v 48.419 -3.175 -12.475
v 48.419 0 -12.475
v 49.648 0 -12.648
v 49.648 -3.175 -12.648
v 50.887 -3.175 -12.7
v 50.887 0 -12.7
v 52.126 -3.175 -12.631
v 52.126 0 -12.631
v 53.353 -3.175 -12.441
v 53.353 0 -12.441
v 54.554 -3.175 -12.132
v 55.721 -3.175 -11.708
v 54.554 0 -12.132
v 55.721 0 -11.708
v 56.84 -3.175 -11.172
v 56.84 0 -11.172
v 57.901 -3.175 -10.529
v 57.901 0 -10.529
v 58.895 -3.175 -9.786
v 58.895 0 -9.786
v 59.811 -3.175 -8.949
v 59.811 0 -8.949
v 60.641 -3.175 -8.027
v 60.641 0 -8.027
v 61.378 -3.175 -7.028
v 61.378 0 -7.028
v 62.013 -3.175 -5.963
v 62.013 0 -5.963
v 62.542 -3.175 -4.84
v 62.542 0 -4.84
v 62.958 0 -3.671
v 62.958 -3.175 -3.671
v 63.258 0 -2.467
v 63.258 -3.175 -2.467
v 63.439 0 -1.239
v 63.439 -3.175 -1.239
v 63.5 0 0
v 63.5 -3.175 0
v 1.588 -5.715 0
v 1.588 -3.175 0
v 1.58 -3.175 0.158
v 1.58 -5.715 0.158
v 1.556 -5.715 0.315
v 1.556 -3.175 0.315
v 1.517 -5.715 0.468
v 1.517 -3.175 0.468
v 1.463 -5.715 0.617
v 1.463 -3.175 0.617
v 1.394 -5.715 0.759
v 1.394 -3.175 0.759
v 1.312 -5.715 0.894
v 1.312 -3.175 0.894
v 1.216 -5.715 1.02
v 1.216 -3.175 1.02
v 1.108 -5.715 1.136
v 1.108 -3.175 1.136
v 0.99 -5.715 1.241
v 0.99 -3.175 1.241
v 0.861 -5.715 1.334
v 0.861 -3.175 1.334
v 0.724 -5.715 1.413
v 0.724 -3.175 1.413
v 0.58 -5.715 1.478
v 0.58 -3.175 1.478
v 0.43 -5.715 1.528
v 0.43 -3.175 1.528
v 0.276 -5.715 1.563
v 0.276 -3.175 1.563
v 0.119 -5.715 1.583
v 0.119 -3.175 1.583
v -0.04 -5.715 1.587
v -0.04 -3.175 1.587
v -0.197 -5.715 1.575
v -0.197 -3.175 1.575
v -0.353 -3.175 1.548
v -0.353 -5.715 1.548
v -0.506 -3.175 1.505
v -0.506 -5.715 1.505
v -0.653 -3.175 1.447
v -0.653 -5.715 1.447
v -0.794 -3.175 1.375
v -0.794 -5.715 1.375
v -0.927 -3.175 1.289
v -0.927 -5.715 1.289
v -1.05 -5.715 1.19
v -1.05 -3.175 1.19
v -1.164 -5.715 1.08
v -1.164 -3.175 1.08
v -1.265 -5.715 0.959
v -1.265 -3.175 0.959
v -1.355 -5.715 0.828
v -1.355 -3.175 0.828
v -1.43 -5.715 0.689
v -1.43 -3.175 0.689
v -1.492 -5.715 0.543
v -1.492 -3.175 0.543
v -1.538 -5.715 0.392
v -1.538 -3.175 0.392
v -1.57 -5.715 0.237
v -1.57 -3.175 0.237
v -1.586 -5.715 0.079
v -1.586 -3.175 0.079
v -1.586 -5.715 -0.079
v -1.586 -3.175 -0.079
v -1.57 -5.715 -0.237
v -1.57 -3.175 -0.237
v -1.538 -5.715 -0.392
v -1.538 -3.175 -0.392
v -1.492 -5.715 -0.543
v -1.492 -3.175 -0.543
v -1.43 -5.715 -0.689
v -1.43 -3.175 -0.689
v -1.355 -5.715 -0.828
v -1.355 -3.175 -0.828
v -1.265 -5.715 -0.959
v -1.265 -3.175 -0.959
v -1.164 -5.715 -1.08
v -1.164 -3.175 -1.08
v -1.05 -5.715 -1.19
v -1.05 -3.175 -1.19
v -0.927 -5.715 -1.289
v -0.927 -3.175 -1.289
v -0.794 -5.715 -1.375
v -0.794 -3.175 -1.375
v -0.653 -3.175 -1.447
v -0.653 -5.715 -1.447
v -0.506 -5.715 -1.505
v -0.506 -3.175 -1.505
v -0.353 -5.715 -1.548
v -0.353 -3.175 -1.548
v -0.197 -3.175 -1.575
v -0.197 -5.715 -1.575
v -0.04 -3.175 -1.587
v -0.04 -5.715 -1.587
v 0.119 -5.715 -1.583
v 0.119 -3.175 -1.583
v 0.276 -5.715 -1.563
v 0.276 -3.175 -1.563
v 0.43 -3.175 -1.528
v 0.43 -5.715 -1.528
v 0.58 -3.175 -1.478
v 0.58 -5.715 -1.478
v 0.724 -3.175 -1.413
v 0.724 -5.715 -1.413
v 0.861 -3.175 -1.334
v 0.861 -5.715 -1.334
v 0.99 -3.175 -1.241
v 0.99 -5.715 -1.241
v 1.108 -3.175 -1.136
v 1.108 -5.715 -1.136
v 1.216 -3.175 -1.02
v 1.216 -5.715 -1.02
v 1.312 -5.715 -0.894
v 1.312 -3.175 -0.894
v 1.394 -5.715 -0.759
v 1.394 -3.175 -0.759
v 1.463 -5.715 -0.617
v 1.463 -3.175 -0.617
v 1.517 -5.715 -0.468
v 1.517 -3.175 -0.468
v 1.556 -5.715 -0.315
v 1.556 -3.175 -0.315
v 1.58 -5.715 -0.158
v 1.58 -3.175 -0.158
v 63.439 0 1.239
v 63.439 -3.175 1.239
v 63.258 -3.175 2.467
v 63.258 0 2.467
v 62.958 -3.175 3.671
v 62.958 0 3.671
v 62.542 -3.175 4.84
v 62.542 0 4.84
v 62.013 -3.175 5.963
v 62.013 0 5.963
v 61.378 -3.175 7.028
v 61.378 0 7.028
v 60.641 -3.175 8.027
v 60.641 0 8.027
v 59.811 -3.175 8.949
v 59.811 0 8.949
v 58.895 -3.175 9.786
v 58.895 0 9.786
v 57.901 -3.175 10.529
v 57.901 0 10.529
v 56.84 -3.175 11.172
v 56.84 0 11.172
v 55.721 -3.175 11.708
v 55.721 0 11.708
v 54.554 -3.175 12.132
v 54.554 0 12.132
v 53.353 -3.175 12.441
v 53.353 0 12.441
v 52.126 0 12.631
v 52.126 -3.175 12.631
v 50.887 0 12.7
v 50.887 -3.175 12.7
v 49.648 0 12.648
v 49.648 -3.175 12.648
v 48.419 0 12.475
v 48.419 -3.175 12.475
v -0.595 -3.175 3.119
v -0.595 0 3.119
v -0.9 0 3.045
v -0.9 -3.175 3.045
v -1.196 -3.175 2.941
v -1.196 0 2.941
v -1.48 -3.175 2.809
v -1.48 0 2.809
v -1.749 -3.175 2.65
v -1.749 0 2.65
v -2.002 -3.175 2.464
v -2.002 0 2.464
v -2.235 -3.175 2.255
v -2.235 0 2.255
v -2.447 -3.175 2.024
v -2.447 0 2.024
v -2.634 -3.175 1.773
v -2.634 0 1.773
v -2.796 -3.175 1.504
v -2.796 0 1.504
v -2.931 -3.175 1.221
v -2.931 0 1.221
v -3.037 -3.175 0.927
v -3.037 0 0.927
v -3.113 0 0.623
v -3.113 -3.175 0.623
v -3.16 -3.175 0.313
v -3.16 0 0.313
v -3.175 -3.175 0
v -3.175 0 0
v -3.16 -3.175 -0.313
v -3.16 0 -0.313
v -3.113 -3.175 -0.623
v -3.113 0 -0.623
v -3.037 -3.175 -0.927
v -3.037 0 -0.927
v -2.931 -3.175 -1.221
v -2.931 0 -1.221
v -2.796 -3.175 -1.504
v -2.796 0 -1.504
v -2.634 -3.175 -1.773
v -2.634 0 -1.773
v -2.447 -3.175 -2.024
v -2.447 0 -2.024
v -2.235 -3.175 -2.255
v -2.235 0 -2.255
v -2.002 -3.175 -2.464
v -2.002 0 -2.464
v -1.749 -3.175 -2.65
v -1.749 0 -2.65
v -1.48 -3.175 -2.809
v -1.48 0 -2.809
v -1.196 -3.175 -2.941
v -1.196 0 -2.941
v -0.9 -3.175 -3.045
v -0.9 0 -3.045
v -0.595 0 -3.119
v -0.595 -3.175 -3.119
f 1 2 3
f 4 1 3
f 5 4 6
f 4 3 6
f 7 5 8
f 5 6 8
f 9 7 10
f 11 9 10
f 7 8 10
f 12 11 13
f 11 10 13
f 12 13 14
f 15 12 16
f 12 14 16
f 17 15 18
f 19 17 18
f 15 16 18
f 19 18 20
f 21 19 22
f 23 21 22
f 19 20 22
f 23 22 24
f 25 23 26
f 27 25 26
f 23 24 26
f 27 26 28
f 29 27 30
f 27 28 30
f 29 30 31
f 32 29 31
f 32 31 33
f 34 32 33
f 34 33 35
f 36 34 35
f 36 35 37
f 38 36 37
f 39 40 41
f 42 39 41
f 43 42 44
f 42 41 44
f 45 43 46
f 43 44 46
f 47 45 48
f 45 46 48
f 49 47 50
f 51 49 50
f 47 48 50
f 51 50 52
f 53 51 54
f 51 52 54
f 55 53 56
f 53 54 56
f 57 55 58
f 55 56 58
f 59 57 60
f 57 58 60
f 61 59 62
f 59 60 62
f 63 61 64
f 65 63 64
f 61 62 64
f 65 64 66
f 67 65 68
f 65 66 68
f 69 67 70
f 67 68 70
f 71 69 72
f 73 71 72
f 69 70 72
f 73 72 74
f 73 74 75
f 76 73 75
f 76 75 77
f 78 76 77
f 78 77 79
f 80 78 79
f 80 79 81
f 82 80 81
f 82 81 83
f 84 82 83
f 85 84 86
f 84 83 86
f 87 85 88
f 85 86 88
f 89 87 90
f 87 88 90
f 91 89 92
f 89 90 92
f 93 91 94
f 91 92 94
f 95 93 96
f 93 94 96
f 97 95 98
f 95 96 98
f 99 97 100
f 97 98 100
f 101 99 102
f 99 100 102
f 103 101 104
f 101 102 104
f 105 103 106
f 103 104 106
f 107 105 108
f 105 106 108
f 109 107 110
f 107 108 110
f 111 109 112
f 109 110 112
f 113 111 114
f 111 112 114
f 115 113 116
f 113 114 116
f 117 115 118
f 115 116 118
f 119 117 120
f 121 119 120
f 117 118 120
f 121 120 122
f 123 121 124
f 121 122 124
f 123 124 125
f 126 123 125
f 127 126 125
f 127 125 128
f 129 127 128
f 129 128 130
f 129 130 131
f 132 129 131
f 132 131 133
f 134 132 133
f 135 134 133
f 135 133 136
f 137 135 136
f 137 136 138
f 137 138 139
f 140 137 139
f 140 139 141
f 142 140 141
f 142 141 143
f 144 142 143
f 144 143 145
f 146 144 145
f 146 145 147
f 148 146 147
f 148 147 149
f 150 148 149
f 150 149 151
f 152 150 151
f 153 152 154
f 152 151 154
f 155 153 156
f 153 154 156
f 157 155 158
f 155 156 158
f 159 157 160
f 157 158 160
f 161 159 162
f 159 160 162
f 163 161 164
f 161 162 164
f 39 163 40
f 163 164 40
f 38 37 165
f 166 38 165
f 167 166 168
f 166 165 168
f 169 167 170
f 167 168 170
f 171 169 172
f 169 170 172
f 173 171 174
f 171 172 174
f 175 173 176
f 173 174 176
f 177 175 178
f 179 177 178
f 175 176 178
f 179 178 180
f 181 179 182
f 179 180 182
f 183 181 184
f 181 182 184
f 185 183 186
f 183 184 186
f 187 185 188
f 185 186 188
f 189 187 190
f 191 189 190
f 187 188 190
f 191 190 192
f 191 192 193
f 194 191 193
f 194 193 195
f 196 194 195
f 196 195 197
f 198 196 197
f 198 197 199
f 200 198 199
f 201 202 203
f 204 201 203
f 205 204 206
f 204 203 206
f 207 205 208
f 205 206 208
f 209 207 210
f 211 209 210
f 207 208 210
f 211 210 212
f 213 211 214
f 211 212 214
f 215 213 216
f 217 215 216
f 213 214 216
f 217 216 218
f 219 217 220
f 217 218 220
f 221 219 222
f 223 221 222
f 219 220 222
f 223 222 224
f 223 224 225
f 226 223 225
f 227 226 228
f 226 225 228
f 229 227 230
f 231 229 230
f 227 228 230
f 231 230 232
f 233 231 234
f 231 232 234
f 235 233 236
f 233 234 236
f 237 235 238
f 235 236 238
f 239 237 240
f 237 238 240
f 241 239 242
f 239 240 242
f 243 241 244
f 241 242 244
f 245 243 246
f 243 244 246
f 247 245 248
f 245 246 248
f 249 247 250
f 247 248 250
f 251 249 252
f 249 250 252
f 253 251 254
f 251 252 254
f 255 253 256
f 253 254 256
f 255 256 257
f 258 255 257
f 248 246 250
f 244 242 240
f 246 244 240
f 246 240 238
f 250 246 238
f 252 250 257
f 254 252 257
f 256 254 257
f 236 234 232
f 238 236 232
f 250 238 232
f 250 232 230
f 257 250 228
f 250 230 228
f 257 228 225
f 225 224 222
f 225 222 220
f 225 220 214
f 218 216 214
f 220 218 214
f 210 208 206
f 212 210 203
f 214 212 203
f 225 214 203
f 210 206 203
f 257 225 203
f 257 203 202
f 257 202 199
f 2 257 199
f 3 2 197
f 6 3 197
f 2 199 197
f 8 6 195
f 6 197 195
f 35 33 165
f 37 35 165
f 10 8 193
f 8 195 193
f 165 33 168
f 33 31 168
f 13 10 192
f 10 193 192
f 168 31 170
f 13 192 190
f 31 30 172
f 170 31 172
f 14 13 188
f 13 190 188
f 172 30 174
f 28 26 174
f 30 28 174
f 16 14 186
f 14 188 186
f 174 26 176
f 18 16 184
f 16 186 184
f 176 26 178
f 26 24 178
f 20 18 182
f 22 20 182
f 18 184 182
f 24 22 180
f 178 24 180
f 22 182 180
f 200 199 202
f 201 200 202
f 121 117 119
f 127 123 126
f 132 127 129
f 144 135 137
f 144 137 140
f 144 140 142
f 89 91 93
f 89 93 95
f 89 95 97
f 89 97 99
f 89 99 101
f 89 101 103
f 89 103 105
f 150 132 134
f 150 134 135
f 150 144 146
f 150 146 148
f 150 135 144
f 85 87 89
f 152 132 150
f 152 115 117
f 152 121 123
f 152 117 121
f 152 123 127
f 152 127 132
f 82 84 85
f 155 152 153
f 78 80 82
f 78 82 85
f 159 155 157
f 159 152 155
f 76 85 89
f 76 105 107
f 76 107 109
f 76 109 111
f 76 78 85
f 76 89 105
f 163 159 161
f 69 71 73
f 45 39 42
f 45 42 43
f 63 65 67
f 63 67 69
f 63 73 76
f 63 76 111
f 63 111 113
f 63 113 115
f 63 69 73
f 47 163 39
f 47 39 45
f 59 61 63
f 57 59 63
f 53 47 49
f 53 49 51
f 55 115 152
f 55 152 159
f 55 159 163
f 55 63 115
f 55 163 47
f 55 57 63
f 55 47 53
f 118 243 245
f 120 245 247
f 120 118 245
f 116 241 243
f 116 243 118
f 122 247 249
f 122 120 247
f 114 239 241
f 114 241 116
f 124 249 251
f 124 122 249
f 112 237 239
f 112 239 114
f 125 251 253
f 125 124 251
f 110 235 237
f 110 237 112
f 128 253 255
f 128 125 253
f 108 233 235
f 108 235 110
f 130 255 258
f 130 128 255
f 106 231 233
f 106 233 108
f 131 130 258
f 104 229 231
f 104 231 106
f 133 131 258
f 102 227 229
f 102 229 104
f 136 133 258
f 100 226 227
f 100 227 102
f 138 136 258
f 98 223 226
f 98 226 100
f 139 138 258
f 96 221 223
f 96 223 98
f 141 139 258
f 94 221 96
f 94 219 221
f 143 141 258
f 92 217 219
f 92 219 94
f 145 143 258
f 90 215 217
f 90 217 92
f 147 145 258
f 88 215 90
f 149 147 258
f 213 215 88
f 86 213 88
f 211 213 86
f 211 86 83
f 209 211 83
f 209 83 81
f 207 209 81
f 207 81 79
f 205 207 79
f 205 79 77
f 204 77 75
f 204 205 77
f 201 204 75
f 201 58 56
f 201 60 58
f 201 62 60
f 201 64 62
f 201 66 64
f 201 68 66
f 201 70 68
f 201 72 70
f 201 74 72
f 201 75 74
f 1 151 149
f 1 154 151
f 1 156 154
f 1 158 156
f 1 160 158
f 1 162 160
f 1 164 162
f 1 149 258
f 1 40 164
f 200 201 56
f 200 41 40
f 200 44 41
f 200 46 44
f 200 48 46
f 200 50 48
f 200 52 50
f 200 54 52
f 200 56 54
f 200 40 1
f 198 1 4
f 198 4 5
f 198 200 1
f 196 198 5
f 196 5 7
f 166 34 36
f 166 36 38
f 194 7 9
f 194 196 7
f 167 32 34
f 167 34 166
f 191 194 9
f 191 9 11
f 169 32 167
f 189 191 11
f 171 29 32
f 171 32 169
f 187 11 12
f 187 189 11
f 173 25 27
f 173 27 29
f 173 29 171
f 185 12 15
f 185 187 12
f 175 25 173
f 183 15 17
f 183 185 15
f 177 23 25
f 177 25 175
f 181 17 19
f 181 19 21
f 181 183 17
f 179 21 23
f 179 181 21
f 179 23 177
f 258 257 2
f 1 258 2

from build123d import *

# Parameters (mm, degrees)
F1_DEPTH = 3.175
F2_R     = 1.5875
F3_DEPTH = 2.54


with BuildPart() as f1:
    # F0 (on Front) → F1 (new body)
    with BuildSketch(Plane.XZ):
        with BuildLine():
            ThreePointArc((-0.595313, -3.11869), (2.023673, -2.446502), (3.175, 0))
            ThreePointArc((3.175, 0), (2.023673, 2.446502), (-0.595313, 3.11869))
            ThreePointArc((-0.595313, 3.11869), (-3.175, 0), (-0.595313, -3.11869))
        make_face()
        with BuildLine():
            ThreePointArc((-0.595313, 3.11869), (2.023673, 2.446502), (3.175, 0))
            ThreePointArc((3.175, 0), (2.023673, -2.446502), (-0.595313, -3.11869))
            Line((-0.595313, -3.11869), (48.41875, -12.47476))
            ThreePointArc((48.41875, -12.47476), (38.1, 0), (48.41875, 12.47476))
            Line((48.41875, 12.47476), (-0.595313, 3.11869))
        make_face()
        with BuildLine():
            ThreePointArc((63.5, 0), (58.894693, 9.786007), (48.41875, 12.47476))
            ThreePointArc((48.41875, 12.47476), (38.1, 0), (48.41875, -12.47476))
            ThreePointArc((48.41875, -12.47476), (58.894693, -9.786007), (63.5, 0))
        make_face()
    extrude(amount=F1_DEPTH)

    # F2 (on face) → F3 (join)
    with BuildSketch(Plane.XZ.offset(3.175)):
        Circle(F2_R)
    extrude(amount=F3_DEPTH)


solid = f1.part
